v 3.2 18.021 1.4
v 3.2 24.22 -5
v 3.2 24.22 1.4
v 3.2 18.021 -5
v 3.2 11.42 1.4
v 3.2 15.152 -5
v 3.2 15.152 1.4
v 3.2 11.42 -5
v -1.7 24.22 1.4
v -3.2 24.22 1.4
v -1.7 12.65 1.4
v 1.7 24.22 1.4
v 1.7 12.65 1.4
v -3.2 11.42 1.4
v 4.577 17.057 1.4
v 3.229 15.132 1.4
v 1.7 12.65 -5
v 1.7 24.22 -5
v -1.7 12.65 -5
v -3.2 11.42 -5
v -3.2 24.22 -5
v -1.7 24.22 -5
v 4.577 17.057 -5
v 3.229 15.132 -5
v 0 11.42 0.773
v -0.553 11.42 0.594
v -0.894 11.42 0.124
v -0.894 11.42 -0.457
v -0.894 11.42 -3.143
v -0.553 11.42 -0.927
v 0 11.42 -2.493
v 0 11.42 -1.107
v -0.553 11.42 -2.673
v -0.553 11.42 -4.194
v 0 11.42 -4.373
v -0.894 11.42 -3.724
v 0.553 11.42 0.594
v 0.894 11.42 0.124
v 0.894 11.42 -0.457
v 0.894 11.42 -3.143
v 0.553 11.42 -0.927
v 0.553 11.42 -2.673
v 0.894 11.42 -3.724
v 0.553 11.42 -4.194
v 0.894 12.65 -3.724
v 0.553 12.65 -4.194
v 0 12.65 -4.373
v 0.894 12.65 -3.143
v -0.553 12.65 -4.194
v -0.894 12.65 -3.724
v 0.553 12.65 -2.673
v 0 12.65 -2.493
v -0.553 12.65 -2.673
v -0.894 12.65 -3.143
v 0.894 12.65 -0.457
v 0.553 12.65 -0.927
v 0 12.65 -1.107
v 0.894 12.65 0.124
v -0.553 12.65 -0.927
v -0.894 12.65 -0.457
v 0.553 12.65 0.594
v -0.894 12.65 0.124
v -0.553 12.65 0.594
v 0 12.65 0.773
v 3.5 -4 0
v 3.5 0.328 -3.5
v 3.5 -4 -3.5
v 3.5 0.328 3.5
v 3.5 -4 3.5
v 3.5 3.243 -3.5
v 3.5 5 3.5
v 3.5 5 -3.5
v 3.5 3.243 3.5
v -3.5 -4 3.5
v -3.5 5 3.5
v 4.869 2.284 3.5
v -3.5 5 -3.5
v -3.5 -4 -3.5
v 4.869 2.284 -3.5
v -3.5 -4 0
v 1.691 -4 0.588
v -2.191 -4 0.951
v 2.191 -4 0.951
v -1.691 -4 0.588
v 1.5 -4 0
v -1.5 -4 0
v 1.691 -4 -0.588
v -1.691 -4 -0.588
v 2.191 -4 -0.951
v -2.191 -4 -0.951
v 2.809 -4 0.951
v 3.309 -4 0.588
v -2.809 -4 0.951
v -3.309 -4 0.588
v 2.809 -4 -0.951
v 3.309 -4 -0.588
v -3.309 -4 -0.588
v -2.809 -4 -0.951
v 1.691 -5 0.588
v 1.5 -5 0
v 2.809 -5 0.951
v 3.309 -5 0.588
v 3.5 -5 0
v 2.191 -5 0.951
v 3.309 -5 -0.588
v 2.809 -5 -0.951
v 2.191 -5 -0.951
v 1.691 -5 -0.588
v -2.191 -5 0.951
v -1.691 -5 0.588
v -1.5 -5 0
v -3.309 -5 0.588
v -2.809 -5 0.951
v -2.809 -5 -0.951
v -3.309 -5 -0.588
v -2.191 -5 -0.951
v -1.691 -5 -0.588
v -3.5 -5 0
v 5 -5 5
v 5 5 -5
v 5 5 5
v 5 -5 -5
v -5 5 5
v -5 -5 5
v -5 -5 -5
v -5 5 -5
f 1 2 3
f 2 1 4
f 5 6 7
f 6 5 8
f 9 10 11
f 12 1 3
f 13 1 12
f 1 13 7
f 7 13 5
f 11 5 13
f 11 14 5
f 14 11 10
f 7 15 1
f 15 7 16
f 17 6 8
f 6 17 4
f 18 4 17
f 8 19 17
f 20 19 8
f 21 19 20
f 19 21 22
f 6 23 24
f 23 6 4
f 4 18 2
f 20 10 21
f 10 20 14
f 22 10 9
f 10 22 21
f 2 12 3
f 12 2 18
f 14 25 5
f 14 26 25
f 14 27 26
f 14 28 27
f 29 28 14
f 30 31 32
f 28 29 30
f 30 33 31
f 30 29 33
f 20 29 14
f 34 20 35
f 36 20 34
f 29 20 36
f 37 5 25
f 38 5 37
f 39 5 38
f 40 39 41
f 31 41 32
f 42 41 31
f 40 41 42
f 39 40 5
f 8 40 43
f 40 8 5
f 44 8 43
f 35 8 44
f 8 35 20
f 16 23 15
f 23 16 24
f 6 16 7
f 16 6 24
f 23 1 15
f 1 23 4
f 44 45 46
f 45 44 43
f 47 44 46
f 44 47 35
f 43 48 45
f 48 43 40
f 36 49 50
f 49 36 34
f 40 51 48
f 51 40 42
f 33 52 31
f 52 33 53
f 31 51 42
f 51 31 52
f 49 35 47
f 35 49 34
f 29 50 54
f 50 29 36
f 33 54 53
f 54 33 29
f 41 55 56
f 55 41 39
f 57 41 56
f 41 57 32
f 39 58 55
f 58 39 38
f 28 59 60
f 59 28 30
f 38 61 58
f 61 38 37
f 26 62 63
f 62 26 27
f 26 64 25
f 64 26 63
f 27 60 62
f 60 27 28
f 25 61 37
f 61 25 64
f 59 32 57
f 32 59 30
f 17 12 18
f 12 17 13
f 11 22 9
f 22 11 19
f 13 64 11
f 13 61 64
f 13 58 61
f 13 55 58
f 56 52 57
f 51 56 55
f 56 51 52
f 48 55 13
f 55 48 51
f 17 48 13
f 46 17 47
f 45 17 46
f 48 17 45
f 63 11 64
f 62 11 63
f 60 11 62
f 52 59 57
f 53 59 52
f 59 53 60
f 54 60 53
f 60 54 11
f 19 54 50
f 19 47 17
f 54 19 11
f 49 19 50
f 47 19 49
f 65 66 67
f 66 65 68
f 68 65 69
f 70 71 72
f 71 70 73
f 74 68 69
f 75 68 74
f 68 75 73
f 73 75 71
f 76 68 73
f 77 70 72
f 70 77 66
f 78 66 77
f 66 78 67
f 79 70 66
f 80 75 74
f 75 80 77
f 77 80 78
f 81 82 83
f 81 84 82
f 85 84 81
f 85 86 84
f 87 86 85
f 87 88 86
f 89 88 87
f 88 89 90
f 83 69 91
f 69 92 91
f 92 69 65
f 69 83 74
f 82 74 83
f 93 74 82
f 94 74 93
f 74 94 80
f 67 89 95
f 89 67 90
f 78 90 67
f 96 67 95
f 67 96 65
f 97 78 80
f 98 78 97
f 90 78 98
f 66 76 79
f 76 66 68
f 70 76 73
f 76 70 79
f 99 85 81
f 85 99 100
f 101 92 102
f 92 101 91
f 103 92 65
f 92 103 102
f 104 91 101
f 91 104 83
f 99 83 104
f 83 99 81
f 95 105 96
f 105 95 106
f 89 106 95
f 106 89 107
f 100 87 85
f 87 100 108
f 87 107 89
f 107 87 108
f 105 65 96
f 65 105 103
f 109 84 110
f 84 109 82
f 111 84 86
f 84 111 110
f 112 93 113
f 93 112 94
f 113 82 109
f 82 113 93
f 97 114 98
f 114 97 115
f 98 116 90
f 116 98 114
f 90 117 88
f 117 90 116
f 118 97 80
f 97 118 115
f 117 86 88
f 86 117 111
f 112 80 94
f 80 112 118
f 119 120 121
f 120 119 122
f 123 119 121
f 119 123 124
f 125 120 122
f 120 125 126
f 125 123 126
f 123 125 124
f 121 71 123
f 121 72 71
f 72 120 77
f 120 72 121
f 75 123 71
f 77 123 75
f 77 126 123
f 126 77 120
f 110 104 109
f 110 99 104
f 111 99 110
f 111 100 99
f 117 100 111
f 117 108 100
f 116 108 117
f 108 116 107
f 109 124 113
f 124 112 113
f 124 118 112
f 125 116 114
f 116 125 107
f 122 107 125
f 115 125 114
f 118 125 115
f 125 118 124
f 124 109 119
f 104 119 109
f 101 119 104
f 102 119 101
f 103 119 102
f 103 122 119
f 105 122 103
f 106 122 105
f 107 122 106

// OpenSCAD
/*
 * TODO
 ** make more parametric
 ** add parameter to specify number of wires/pins
 */

$fn=10; //Minimum nuber of circle segments

module conn_male(size=23, thickness=1.5, full=false) {
	difference() {
		union() {
			translate([0,size*0.3,0]) cube([size-(thickness*2),(size-(thickness*2))*2,size-(thickness*2)], center=true);
			translate([size/3,(size/3)-thickness]) rotate([0,0,145]) cube([size*0.2,size/4,size-(thickness*2)], center=true);
		}
		if(!full) {
			translate([0,size/2,0]) cube([size-(thickness*4),size*1.5,size+1], center=true);
			rotate([0,90,0])
			for(i = [(size/3)-thickness,-(size/3)+thickness])
				translate([i,0,0]) 
				rotate([90,0,0])
				cylinder(size*2, size/10, size/10);
		}
	}
}

module conn_female(size=23, thickness=1.5) {
	difference() {
		cube(size, center=true);
		conn_male(size, thickness=thickness, full=true);
		for(i = [size/4,-size/4])
			translate([i,0,0]) 
			rotate([90,0,0]) cylinder(size*2, size/10, size/10);
	}
}

module connector(size=10, thickness=1.5, gap=0.6, design=false) {
	if(!design) {
		//Print
		translate([0,size*1.5,-(thickness+gap/2)]) conn_male(size-gap,thickness);
		conn_female(size,thickness);
	} else {
		//Design
		conn_male(size-gap,thickness);
		% conn_female(size,thickness);
	}
}

//connector(design=true);
connector();
